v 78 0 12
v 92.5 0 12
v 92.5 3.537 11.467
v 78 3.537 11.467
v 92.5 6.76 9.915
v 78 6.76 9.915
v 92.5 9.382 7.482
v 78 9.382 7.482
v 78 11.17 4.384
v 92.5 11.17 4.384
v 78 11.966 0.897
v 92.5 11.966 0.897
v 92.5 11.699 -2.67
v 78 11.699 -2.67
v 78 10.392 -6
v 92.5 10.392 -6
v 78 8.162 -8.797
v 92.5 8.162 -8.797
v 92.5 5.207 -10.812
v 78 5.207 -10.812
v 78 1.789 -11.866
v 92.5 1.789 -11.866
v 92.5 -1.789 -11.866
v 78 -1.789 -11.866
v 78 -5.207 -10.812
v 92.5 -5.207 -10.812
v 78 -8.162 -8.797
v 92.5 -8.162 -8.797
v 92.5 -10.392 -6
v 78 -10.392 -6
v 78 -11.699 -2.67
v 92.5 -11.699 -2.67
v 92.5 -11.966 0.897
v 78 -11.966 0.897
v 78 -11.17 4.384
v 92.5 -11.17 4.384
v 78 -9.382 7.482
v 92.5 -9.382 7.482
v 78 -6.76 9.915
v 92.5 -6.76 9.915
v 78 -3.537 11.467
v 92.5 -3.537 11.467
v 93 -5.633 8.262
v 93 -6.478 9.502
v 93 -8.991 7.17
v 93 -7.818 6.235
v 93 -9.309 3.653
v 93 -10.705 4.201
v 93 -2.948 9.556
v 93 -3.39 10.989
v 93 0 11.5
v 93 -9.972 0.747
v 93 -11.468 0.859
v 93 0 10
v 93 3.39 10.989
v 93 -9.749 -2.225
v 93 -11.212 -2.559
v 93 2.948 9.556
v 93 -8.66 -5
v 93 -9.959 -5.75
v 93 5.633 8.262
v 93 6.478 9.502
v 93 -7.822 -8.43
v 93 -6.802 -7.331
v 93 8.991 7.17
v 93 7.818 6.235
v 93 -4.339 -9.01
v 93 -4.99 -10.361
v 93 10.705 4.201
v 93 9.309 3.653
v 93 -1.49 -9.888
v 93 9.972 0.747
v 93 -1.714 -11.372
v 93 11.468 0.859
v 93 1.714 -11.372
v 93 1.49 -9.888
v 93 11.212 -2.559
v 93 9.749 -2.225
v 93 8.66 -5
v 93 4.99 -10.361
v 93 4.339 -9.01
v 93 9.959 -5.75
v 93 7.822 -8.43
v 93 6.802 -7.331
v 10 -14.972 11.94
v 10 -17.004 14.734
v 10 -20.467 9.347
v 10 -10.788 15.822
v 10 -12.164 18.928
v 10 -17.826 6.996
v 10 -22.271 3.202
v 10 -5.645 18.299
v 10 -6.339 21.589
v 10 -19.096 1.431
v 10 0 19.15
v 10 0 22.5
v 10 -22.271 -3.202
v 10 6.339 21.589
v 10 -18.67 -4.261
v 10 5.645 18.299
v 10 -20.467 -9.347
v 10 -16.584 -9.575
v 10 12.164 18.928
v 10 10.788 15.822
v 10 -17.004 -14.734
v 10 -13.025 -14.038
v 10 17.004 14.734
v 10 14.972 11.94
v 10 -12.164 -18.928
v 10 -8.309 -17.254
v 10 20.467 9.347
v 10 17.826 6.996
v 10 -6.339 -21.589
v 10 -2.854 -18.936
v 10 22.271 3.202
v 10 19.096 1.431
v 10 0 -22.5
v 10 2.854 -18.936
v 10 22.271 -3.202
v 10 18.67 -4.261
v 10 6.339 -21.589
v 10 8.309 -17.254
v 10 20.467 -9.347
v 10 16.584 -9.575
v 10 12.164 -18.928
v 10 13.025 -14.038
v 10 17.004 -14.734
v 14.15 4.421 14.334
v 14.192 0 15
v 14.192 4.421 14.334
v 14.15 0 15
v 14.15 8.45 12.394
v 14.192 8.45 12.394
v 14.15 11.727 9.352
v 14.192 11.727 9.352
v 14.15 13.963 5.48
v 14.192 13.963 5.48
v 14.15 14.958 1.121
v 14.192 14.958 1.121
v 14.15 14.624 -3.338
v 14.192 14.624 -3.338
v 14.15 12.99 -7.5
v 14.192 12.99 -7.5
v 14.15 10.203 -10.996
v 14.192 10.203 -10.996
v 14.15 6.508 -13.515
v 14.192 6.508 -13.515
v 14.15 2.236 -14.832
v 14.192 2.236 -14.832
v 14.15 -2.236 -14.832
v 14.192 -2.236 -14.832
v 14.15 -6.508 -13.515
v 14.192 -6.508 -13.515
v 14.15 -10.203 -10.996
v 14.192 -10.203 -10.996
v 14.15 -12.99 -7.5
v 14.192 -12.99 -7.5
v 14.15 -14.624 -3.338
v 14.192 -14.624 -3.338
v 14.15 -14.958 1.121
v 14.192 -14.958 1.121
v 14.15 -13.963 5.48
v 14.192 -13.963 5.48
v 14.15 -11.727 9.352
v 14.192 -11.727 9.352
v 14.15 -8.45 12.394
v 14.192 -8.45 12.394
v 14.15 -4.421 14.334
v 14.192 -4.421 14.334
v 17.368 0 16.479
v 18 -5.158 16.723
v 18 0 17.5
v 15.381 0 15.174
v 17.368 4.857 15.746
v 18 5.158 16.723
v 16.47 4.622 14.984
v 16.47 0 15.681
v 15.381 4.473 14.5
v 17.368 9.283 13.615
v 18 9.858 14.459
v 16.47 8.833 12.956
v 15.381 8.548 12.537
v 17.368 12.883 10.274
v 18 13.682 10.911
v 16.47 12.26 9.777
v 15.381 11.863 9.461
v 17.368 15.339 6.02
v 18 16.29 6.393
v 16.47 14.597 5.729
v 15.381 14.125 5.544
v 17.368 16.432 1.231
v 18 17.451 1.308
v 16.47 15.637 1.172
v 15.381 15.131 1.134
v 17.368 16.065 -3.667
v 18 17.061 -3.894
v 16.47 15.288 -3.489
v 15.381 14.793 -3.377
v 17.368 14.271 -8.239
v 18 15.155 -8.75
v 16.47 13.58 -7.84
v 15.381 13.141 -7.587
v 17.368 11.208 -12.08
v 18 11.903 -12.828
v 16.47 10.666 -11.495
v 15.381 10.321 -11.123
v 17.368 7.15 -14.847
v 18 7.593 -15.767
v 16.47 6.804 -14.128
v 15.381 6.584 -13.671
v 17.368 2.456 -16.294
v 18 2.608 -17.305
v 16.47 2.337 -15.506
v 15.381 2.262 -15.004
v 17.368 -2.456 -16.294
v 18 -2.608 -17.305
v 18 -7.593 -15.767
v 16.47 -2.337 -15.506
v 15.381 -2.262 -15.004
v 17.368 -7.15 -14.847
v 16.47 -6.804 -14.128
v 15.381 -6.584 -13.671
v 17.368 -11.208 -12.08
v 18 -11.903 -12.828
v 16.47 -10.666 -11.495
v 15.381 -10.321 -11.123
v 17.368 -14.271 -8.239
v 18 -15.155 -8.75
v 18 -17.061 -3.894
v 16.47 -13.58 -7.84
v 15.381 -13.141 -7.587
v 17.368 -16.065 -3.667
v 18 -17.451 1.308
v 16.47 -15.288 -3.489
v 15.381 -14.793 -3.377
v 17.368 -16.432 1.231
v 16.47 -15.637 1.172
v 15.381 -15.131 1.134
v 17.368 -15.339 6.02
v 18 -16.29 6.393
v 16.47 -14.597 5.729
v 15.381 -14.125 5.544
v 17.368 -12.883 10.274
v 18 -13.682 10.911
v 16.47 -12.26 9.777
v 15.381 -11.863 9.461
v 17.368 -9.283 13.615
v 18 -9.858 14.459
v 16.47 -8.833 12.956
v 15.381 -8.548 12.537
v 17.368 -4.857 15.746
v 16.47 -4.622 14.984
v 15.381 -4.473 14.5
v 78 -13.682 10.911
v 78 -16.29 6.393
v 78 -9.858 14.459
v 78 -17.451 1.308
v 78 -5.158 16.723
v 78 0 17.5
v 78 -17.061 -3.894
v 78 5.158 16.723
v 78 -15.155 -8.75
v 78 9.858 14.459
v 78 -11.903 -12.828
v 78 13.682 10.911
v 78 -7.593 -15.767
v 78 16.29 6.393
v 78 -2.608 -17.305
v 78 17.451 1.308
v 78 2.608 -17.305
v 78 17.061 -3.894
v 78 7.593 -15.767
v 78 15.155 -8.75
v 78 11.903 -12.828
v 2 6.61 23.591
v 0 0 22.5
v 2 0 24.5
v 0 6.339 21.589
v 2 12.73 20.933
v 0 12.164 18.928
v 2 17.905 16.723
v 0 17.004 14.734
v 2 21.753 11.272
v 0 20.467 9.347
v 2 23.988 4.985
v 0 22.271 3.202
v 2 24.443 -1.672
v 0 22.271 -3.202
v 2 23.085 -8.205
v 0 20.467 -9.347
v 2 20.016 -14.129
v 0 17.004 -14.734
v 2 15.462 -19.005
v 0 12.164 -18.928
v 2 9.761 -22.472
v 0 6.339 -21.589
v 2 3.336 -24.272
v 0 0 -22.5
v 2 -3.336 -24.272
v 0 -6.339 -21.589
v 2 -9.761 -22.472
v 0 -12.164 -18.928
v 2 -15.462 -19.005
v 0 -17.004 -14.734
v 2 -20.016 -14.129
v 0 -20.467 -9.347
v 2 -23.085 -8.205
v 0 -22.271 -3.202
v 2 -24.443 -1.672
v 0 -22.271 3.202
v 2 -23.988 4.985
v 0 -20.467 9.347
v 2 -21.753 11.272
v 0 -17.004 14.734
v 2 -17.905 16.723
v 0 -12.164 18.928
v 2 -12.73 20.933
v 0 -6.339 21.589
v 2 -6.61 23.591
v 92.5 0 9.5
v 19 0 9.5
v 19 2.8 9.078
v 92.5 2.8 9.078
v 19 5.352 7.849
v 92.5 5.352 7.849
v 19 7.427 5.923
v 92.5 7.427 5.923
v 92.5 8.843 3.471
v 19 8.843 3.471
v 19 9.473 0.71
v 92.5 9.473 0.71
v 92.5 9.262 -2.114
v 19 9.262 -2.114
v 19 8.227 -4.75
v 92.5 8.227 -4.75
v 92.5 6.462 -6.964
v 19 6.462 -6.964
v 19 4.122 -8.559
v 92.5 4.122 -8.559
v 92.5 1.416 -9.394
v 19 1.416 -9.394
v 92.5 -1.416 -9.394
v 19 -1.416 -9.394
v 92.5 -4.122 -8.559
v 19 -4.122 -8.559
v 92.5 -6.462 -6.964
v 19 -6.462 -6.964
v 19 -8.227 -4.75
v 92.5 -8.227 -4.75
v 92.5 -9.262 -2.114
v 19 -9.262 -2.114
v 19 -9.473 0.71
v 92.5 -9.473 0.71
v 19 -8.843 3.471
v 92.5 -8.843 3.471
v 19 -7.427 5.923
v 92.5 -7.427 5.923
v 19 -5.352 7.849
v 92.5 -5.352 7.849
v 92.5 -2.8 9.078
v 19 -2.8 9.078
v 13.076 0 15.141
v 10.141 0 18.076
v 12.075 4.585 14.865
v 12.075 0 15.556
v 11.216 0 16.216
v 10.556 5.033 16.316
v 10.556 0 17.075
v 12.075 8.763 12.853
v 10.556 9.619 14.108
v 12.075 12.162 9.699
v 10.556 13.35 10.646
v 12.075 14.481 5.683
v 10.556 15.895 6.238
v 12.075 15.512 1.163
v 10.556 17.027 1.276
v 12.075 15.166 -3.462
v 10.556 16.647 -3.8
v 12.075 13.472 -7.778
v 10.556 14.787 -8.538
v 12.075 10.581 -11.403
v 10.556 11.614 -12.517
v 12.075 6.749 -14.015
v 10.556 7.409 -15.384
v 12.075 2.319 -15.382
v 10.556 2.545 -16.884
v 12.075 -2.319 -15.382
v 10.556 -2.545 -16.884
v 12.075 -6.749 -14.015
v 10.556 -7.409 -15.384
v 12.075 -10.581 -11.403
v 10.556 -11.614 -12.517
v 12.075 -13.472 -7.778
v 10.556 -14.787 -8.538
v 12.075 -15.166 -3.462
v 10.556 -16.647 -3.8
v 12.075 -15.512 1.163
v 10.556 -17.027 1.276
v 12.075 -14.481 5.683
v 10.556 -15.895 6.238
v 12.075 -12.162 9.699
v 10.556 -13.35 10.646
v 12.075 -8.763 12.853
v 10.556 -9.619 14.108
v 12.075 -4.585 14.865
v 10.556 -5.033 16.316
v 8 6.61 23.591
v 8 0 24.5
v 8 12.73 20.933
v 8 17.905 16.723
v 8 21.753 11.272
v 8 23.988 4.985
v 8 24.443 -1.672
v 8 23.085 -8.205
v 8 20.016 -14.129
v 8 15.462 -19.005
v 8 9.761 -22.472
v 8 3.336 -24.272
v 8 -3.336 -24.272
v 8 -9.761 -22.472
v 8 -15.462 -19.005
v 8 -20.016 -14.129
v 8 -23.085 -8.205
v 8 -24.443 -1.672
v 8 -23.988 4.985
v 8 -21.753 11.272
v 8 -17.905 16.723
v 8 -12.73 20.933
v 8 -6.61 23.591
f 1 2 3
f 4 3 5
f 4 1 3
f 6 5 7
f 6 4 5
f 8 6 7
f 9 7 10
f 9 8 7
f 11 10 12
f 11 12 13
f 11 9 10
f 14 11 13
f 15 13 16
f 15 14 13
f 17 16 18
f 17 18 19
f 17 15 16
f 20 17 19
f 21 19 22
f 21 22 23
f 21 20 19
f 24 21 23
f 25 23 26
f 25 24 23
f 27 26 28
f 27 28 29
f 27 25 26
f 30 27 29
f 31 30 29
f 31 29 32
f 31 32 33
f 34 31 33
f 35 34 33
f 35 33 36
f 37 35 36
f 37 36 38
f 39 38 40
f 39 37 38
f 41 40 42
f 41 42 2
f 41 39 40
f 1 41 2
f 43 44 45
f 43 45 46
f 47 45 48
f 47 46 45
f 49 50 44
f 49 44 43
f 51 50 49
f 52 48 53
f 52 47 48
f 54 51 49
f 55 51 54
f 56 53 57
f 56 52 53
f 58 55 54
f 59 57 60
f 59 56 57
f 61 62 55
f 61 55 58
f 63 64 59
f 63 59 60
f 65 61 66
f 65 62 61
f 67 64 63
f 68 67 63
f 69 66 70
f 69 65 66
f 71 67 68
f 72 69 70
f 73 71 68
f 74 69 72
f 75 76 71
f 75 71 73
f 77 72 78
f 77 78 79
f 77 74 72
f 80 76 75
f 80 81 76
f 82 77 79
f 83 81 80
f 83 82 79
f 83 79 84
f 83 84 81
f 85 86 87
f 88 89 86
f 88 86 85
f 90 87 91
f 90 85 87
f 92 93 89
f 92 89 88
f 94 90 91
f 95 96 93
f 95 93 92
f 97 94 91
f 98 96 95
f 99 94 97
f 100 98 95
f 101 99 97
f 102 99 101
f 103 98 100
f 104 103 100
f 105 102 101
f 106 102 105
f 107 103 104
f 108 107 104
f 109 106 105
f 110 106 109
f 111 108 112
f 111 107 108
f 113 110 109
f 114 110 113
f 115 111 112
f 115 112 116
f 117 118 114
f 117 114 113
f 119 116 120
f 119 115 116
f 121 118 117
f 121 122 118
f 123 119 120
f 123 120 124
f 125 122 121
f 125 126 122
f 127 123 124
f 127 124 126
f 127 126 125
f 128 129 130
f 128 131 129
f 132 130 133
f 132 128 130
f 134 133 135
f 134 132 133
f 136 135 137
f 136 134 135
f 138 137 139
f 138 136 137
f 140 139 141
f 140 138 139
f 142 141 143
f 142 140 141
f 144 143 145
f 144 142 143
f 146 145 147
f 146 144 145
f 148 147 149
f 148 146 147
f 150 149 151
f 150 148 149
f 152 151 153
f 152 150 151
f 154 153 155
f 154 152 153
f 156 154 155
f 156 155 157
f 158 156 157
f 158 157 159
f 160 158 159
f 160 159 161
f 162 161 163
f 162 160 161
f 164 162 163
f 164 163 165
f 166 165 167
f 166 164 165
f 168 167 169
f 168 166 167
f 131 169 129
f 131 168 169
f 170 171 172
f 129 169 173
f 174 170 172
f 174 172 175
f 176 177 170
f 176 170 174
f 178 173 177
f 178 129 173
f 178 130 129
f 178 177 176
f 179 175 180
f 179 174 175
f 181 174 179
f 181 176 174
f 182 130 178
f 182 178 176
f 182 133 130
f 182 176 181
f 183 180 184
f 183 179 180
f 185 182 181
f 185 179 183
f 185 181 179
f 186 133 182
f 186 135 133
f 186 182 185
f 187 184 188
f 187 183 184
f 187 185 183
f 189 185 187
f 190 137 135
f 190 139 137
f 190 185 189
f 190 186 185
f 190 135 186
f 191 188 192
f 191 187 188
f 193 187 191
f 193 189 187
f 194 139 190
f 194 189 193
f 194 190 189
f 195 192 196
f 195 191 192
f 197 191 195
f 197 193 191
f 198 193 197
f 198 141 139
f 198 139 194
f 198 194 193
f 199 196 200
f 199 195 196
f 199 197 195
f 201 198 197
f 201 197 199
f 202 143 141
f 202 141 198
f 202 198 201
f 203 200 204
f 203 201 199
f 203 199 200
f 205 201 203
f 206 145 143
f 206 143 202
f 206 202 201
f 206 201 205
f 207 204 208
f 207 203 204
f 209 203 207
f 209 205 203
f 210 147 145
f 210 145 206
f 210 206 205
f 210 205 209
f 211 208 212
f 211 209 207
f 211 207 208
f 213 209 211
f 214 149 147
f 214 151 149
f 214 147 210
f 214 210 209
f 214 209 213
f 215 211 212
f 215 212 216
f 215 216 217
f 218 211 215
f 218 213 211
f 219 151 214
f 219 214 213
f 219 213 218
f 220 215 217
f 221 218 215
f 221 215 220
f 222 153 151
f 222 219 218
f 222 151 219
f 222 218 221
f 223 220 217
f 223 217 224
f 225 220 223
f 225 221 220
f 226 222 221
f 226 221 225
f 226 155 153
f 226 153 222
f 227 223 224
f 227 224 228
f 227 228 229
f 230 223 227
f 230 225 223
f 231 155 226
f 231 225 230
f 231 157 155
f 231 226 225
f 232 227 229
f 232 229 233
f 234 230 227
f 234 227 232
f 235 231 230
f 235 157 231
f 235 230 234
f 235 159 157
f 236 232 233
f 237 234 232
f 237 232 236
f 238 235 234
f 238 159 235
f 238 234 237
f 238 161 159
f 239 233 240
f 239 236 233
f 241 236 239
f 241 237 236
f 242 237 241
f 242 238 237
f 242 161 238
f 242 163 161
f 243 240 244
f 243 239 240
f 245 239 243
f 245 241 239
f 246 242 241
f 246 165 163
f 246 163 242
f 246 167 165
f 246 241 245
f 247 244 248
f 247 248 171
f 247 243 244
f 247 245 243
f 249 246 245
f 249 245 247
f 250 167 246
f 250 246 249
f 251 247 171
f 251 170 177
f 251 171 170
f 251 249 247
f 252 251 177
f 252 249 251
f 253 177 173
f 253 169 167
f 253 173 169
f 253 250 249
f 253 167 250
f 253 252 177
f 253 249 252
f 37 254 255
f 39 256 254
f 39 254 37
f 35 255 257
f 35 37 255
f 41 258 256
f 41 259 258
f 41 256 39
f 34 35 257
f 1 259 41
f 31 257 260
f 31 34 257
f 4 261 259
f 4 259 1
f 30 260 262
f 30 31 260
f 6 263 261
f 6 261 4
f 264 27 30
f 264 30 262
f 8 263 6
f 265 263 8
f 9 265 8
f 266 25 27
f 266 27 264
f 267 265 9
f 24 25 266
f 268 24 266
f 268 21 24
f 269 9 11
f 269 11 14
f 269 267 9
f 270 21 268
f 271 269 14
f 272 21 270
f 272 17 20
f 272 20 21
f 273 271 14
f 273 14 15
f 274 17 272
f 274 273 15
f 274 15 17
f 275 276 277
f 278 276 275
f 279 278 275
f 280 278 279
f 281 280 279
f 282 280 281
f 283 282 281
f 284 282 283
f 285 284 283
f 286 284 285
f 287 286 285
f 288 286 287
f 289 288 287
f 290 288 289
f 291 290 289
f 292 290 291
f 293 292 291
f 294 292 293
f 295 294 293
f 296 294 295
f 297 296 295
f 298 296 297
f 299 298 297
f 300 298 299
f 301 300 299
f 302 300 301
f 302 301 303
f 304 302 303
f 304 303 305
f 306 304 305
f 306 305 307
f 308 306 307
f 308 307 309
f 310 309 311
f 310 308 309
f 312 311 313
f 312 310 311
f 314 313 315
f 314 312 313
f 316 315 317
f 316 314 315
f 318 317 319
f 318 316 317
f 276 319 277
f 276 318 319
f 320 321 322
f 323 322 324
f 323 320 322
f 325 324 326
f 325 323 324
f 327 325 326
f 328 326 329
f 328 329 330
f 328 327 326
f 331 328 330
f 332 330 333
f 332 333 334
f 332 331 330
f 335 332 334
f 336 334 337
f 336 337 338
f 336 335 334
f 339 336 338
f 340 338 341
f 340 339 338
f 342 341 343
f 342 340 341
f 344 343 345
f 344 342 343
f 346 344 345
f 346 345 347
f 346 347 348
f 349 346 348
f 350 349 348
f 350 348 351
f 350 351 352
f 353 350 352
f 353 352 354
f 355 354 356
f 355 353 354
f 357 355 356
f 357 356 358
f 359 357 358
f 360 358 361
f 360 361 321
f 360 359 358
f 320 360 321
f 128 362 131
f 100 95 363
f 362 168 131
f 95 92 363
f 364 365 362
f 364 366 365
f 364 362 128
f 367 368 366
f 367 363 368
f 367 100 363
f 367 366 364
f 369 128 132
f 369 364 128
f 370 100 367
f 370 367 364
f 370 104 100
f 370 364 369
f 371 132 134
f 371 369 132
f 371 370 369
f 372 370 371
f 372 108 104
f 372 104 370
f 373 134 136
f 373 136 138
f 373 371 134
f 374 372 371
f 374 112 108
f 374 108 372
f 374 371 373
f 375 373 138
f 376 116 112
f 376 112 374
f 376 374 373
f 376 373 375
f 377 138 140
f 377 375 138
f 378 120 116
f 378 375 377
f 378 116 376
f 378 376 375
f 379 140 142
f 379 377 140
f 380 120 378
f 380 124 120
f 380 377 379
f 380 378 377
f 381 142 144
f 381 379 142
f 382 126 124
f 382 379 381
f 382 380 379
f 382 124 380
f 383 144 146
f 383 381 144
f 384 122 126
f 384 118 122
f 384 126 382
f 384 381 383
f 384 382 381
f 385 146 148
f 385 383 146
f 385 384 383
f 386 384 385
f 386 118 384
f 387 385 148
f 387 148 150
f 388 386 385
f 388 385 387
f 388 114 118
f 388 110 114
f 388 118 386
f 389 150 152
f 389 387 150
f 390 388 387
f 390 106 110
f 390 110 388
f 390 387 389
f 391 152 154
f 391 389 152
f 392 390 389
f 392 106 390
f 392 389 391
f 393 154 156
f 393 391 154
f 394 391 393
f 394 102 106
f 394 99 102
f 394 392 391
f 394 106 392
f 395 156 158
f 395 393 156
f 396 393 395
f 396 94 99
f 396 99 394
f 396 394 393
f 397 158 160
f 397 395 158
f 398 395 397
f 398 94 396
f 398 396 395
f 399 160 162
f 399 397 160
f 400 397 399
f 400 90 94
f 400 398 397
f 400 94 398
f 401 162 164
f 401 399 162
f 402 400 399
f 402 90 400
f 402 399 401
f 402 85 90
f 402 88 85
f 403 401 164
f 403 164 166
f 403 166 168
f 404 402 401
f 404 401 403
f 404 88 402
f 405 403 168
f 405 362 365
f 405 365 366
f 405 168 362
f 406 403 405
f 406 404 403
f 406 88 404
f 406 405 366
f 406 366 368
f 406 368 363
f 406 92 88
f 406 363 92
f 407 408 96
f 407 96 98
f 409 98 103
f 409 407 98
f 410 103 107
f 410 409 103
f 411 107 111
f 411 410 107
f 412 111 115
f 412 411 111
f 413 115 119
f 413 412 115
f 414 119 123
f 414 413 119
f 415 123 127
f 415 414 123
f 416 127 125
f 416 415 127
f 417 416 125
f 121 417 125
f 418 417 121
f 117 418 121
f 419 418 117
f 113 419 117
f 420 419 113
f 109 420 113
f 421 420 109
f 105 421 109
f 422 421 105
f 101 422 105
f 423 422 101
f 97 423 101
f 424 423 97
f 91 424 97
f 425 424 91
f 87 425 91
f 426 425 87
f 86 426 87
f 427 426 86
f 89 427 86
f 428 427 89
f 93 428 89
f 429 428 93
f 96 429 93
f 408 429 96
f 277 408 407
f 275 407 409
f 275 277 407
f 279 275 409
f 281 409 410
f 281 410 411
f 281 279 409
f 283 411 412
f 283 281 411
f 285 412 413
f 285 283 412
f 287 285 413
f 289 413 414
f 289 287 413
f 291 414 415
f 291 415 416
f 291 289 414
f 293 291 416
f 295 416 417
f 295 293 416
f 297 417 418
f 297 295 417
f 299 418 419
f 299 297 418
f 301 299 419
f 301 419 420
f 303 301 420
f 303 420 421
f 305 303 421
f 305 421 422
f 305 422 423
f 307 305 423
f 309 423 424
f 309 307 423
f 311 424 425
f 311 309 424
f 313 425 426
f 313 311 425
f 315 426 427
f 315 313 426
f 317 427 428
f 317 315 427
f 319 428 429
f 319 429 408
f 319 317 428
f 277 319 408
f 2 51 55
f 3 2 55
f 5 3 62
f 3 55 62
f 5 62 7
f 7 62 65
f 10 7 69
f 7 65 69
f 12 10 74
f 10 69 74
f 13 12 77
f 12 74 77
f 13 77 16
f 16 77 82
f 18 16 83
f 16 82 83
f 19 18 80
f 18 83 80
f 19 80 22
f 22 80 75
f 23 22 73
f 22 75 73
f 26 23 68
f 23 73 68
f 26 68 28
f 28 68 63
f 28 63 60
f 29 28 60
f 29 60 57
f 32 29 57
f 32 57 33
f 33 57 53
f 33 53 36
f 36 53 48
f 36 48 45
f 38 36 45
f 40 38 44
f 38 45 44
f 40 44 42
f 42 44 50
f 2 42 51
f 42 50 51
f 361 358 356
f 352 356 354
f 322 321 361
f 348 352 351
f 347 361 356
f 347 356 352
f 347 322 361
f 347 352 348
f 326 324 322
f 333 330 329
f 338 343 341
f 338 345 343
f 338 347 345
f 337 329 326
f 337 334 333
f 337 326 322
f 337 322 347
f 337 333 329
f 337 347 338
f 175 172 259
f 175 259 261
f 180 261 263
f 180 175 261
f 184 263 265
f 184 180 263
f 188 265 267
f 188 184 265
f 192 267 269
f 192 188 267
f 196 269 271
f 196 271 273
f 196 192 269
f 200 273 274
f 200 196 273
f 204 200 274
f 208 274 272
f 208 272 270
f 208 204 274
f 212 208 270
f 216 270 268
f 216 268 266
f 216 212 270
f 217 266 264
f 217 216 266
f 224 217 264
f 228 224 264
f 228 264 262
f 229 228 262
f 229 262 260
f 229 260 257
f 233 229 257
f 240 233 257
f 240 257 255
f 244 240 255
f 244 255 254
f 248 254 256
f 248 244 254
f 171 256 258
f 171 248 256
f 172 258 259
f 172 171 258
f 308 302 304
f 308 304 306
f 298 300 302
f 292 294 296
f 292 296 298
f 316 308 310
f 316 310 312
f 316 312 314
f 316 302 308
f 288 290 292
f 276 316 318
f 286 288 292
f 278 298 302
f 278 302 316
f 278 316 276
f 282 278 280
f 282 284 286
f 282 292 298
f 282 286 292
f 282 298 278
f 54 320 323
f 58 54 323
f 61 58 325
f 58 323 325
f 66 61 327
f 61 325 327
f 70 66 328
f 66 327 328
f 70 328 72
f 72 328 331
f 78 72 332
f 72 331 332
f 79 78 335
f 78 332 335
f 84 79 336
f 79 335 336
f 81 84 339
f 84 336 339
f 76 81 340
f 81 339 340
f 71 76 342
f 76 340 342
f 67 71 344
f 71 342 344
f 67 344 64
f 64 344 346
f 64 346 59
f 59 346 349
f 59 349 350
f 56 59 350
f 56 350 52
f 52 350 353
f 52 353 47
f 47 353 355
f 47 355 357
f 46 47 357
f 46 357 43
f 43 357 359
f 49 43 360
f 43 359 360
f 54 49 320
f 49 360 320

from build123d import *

# Parameters (mm, degrees)
F3_SIZE = 2
F4_SIZE = 0.5


# Not quite as in the source:
# - a fillet or chamfer that OpenCascade refuses, or shapes differently, is made with other operations: its cross-section is extruded or revolved along the edge and cut away or added


with BuildPart() as f1:
    # F0 (on Front) → F1 (revolve)
    with BuildSketch(Plane.XZ):
        Polygon((0, 24.5), (0, 0), (19, 0), (19, 9.5), (93, 9.5), (93, 12), (78, 12), (78, 17.5), (18, 17.5), (18, 15), (10, 15), (10, 24.5), align=None)
    revolve(axis=Axis((9.5, 0, 0), (-1, 0, 0)))

    # F2: fillet of radius 4.15 on 2 edges, made by hand

    # F2_s1 → F2_t2 (revolve)
    with BuildSketch(Plane.XZ):
        with BuildLine():
            ThreePointArc((14.15, 15), (11.2155068581, 16.2155068581), (10, 19.15))
            Line((10, 19.15), (10, 15))
            Line((10, 15), (14.15, 15))
        make_face()
    revolve(axis=Axis((10, 0, 0), (-1, 0, 0)))

    # F2_s3 → F2_t4 (revolve)
    with BuildSketch(Plane.XZ):
        with BuildLine():
            ThreePointArc((18, 17.5), (16.4697218419, 15.6808502483), (14.1921134471, 15))
            Line((14.1921134471, 15), (18, 15))
            Line((18, 15), (18, 17.5))
        make_face()
    revolve(axis=Axis((18, 0, 0), (-1, 0, 0)))

    # F3
    f3_edges = [f1.edges().sort_by_distance(p)[0] for p in [
        (0, 0, -24.5),
        (10, 0, -24.5),
    ]]
    chamfer(f3_edges, length=F3_SIZE)

    # F4
    f4_edges = [f1.edges().sort_by_distance(p)[0] for p in [
        (93, 0, -12),
        (93, 0, -9.5),
    ]]
    chamfer(f4_edges, length=F4_SIZE)


solid = f1.part
